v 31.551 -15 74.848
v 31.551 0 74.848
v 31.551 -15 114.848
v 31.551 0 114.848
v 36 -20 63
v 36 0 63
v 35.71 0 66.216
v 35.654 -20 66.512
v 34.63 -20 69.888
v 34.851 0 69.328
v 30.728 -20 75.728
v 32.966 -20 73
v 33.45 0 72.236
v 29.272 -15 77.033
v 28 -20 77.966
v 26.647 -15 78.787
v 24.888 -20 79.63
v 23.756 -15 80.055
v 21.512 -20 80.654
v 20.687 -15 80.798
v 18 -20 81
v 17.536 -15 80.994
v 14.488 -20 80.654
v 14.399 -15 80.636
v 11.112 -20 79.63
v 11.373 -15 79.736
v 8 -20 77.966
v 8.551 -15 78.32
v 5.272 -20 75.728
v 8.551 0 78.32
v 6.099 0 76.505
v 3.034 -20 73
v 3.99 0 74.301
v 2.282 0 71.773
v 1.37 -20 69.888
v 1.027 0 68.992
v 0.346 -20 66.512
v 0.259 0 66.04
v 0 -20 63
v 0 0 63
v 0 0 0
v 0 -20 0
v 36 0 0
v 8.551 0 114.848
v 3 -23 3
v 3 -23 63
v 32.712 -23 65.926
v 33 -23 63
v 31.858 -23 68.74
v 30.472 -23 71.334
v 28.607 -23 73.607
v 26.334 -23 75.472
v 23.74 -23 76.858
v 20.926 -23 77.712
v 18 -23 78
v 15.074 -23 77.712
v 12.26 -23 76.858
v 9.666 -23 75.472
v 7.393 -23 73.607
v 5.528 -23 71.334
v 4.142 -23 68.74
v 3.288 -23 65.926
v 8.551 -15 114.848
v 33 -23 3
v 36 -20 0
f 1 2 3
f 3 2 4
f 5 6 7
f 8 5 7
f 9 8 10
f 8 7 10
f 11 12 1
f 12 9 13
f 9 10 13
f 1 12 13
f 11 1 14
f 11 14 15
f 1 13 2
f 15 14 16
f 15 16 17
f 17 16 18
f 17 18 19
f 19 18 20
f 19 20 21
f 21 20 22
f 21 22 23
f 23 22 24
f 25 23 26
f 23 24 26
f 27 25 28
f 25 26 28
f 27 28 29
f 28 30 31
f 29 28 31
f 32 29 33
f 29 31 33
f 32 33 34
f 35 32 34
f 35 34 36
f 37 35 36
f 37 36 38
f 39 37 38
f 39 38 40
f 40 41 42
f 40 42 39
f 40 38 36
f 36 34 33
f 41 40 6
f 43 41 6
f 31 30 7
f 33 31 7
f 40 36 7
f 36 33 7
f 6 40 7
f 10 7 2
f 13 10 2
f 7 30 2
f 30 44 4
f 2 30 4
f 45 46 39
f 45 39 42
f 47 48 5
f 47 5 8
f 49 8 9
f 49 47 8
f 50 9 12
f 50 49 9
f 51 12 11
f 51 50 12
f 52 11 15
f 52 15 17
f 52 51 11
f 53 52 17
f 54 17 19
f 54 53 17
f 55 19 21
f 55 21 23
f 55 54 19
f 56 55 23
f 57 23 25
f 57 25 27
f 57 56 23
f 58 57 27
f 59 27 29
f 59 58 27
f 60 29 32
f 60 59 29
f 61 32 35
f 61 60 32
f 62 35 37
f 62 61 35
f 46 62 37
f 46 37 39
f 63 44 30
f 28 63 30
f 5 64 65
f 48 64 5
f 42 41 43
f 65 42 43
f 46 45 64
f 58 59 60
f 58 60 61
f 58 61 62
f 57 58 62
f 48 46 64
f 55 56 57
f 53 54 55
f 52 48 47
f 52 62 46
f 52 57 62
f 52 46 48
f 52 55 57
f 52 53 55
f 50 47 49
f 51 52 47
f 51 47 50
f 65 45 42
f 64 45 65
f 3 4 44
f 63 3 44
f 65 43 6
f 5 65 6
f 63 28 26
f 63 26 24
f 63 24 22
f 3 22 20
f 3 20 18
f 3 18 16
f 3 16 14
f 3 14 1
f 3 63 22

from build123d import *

# Parameters (mm, degrees)
F0_W     = 36
F0_H     = 63
F1_DEPTH = 23
F2_SIZE  = 3
F4_DEPTH = 15


with BuildPart() as f1:
    # F0 (on Front) → F1 (new body)
    with BuildSketch(Plane.XZ):
        with BuildLine():
            ThreePointArc((36, 63), (18, 81), (0, 63))
            Line((0, 63), (36, 63))
        make_face()
        with Locations((18, 31.5)):
            Rectangle(F0_W, F0_H)
    extrude(amount=F1_DEPTH)

    # F2
    f2_edges = [f1.edges().sort_by_distance(p)[0] for p in [
        (18, -23, 81),
        (0, -23, 31.5),
        (18, -23, 0),
        (36, -23, 31.5),
    ]]
    chamfer(f2_edges, length=F2_SIZE)

    # F3 (on Front) → F4 (join)
    with BuildSketch(Plane.XZ):
        with BuildLine():
            ThreePointArc((8.550904, 78.320398), (9.400963, 78.813177), (10.276645, 79.258837))
            ThreePointArc((10.276645, 79.258837), (21.654333, 80.625148), (31.550904, 74.847911))
            Line((31.550904, 74.847911), (31.550904, 114.847911))
            Line((31.550904, 114.847911), (8.550904, 114.847911))
            Line((8.550904, 114.847911), (8.550904, 78.320398))
        make_face()
        with BuildLine():
            ThreePointArc((31.550904, 74.847911), (21.654333, 80.625148), (10.276645, 79.258837))
            ThreePointArc((10.276645, 79.258837), (9.400963, 78.813177), (8.550904, 78.320398))
            Line((8.550904, 78.320398), (8.550904, 74.847911))
            Line((8.550904, 74.847911), (31.550904, 74.847911))
        make_face()
    extrude(amount=F4_DEPTH)


solid = f1.part
